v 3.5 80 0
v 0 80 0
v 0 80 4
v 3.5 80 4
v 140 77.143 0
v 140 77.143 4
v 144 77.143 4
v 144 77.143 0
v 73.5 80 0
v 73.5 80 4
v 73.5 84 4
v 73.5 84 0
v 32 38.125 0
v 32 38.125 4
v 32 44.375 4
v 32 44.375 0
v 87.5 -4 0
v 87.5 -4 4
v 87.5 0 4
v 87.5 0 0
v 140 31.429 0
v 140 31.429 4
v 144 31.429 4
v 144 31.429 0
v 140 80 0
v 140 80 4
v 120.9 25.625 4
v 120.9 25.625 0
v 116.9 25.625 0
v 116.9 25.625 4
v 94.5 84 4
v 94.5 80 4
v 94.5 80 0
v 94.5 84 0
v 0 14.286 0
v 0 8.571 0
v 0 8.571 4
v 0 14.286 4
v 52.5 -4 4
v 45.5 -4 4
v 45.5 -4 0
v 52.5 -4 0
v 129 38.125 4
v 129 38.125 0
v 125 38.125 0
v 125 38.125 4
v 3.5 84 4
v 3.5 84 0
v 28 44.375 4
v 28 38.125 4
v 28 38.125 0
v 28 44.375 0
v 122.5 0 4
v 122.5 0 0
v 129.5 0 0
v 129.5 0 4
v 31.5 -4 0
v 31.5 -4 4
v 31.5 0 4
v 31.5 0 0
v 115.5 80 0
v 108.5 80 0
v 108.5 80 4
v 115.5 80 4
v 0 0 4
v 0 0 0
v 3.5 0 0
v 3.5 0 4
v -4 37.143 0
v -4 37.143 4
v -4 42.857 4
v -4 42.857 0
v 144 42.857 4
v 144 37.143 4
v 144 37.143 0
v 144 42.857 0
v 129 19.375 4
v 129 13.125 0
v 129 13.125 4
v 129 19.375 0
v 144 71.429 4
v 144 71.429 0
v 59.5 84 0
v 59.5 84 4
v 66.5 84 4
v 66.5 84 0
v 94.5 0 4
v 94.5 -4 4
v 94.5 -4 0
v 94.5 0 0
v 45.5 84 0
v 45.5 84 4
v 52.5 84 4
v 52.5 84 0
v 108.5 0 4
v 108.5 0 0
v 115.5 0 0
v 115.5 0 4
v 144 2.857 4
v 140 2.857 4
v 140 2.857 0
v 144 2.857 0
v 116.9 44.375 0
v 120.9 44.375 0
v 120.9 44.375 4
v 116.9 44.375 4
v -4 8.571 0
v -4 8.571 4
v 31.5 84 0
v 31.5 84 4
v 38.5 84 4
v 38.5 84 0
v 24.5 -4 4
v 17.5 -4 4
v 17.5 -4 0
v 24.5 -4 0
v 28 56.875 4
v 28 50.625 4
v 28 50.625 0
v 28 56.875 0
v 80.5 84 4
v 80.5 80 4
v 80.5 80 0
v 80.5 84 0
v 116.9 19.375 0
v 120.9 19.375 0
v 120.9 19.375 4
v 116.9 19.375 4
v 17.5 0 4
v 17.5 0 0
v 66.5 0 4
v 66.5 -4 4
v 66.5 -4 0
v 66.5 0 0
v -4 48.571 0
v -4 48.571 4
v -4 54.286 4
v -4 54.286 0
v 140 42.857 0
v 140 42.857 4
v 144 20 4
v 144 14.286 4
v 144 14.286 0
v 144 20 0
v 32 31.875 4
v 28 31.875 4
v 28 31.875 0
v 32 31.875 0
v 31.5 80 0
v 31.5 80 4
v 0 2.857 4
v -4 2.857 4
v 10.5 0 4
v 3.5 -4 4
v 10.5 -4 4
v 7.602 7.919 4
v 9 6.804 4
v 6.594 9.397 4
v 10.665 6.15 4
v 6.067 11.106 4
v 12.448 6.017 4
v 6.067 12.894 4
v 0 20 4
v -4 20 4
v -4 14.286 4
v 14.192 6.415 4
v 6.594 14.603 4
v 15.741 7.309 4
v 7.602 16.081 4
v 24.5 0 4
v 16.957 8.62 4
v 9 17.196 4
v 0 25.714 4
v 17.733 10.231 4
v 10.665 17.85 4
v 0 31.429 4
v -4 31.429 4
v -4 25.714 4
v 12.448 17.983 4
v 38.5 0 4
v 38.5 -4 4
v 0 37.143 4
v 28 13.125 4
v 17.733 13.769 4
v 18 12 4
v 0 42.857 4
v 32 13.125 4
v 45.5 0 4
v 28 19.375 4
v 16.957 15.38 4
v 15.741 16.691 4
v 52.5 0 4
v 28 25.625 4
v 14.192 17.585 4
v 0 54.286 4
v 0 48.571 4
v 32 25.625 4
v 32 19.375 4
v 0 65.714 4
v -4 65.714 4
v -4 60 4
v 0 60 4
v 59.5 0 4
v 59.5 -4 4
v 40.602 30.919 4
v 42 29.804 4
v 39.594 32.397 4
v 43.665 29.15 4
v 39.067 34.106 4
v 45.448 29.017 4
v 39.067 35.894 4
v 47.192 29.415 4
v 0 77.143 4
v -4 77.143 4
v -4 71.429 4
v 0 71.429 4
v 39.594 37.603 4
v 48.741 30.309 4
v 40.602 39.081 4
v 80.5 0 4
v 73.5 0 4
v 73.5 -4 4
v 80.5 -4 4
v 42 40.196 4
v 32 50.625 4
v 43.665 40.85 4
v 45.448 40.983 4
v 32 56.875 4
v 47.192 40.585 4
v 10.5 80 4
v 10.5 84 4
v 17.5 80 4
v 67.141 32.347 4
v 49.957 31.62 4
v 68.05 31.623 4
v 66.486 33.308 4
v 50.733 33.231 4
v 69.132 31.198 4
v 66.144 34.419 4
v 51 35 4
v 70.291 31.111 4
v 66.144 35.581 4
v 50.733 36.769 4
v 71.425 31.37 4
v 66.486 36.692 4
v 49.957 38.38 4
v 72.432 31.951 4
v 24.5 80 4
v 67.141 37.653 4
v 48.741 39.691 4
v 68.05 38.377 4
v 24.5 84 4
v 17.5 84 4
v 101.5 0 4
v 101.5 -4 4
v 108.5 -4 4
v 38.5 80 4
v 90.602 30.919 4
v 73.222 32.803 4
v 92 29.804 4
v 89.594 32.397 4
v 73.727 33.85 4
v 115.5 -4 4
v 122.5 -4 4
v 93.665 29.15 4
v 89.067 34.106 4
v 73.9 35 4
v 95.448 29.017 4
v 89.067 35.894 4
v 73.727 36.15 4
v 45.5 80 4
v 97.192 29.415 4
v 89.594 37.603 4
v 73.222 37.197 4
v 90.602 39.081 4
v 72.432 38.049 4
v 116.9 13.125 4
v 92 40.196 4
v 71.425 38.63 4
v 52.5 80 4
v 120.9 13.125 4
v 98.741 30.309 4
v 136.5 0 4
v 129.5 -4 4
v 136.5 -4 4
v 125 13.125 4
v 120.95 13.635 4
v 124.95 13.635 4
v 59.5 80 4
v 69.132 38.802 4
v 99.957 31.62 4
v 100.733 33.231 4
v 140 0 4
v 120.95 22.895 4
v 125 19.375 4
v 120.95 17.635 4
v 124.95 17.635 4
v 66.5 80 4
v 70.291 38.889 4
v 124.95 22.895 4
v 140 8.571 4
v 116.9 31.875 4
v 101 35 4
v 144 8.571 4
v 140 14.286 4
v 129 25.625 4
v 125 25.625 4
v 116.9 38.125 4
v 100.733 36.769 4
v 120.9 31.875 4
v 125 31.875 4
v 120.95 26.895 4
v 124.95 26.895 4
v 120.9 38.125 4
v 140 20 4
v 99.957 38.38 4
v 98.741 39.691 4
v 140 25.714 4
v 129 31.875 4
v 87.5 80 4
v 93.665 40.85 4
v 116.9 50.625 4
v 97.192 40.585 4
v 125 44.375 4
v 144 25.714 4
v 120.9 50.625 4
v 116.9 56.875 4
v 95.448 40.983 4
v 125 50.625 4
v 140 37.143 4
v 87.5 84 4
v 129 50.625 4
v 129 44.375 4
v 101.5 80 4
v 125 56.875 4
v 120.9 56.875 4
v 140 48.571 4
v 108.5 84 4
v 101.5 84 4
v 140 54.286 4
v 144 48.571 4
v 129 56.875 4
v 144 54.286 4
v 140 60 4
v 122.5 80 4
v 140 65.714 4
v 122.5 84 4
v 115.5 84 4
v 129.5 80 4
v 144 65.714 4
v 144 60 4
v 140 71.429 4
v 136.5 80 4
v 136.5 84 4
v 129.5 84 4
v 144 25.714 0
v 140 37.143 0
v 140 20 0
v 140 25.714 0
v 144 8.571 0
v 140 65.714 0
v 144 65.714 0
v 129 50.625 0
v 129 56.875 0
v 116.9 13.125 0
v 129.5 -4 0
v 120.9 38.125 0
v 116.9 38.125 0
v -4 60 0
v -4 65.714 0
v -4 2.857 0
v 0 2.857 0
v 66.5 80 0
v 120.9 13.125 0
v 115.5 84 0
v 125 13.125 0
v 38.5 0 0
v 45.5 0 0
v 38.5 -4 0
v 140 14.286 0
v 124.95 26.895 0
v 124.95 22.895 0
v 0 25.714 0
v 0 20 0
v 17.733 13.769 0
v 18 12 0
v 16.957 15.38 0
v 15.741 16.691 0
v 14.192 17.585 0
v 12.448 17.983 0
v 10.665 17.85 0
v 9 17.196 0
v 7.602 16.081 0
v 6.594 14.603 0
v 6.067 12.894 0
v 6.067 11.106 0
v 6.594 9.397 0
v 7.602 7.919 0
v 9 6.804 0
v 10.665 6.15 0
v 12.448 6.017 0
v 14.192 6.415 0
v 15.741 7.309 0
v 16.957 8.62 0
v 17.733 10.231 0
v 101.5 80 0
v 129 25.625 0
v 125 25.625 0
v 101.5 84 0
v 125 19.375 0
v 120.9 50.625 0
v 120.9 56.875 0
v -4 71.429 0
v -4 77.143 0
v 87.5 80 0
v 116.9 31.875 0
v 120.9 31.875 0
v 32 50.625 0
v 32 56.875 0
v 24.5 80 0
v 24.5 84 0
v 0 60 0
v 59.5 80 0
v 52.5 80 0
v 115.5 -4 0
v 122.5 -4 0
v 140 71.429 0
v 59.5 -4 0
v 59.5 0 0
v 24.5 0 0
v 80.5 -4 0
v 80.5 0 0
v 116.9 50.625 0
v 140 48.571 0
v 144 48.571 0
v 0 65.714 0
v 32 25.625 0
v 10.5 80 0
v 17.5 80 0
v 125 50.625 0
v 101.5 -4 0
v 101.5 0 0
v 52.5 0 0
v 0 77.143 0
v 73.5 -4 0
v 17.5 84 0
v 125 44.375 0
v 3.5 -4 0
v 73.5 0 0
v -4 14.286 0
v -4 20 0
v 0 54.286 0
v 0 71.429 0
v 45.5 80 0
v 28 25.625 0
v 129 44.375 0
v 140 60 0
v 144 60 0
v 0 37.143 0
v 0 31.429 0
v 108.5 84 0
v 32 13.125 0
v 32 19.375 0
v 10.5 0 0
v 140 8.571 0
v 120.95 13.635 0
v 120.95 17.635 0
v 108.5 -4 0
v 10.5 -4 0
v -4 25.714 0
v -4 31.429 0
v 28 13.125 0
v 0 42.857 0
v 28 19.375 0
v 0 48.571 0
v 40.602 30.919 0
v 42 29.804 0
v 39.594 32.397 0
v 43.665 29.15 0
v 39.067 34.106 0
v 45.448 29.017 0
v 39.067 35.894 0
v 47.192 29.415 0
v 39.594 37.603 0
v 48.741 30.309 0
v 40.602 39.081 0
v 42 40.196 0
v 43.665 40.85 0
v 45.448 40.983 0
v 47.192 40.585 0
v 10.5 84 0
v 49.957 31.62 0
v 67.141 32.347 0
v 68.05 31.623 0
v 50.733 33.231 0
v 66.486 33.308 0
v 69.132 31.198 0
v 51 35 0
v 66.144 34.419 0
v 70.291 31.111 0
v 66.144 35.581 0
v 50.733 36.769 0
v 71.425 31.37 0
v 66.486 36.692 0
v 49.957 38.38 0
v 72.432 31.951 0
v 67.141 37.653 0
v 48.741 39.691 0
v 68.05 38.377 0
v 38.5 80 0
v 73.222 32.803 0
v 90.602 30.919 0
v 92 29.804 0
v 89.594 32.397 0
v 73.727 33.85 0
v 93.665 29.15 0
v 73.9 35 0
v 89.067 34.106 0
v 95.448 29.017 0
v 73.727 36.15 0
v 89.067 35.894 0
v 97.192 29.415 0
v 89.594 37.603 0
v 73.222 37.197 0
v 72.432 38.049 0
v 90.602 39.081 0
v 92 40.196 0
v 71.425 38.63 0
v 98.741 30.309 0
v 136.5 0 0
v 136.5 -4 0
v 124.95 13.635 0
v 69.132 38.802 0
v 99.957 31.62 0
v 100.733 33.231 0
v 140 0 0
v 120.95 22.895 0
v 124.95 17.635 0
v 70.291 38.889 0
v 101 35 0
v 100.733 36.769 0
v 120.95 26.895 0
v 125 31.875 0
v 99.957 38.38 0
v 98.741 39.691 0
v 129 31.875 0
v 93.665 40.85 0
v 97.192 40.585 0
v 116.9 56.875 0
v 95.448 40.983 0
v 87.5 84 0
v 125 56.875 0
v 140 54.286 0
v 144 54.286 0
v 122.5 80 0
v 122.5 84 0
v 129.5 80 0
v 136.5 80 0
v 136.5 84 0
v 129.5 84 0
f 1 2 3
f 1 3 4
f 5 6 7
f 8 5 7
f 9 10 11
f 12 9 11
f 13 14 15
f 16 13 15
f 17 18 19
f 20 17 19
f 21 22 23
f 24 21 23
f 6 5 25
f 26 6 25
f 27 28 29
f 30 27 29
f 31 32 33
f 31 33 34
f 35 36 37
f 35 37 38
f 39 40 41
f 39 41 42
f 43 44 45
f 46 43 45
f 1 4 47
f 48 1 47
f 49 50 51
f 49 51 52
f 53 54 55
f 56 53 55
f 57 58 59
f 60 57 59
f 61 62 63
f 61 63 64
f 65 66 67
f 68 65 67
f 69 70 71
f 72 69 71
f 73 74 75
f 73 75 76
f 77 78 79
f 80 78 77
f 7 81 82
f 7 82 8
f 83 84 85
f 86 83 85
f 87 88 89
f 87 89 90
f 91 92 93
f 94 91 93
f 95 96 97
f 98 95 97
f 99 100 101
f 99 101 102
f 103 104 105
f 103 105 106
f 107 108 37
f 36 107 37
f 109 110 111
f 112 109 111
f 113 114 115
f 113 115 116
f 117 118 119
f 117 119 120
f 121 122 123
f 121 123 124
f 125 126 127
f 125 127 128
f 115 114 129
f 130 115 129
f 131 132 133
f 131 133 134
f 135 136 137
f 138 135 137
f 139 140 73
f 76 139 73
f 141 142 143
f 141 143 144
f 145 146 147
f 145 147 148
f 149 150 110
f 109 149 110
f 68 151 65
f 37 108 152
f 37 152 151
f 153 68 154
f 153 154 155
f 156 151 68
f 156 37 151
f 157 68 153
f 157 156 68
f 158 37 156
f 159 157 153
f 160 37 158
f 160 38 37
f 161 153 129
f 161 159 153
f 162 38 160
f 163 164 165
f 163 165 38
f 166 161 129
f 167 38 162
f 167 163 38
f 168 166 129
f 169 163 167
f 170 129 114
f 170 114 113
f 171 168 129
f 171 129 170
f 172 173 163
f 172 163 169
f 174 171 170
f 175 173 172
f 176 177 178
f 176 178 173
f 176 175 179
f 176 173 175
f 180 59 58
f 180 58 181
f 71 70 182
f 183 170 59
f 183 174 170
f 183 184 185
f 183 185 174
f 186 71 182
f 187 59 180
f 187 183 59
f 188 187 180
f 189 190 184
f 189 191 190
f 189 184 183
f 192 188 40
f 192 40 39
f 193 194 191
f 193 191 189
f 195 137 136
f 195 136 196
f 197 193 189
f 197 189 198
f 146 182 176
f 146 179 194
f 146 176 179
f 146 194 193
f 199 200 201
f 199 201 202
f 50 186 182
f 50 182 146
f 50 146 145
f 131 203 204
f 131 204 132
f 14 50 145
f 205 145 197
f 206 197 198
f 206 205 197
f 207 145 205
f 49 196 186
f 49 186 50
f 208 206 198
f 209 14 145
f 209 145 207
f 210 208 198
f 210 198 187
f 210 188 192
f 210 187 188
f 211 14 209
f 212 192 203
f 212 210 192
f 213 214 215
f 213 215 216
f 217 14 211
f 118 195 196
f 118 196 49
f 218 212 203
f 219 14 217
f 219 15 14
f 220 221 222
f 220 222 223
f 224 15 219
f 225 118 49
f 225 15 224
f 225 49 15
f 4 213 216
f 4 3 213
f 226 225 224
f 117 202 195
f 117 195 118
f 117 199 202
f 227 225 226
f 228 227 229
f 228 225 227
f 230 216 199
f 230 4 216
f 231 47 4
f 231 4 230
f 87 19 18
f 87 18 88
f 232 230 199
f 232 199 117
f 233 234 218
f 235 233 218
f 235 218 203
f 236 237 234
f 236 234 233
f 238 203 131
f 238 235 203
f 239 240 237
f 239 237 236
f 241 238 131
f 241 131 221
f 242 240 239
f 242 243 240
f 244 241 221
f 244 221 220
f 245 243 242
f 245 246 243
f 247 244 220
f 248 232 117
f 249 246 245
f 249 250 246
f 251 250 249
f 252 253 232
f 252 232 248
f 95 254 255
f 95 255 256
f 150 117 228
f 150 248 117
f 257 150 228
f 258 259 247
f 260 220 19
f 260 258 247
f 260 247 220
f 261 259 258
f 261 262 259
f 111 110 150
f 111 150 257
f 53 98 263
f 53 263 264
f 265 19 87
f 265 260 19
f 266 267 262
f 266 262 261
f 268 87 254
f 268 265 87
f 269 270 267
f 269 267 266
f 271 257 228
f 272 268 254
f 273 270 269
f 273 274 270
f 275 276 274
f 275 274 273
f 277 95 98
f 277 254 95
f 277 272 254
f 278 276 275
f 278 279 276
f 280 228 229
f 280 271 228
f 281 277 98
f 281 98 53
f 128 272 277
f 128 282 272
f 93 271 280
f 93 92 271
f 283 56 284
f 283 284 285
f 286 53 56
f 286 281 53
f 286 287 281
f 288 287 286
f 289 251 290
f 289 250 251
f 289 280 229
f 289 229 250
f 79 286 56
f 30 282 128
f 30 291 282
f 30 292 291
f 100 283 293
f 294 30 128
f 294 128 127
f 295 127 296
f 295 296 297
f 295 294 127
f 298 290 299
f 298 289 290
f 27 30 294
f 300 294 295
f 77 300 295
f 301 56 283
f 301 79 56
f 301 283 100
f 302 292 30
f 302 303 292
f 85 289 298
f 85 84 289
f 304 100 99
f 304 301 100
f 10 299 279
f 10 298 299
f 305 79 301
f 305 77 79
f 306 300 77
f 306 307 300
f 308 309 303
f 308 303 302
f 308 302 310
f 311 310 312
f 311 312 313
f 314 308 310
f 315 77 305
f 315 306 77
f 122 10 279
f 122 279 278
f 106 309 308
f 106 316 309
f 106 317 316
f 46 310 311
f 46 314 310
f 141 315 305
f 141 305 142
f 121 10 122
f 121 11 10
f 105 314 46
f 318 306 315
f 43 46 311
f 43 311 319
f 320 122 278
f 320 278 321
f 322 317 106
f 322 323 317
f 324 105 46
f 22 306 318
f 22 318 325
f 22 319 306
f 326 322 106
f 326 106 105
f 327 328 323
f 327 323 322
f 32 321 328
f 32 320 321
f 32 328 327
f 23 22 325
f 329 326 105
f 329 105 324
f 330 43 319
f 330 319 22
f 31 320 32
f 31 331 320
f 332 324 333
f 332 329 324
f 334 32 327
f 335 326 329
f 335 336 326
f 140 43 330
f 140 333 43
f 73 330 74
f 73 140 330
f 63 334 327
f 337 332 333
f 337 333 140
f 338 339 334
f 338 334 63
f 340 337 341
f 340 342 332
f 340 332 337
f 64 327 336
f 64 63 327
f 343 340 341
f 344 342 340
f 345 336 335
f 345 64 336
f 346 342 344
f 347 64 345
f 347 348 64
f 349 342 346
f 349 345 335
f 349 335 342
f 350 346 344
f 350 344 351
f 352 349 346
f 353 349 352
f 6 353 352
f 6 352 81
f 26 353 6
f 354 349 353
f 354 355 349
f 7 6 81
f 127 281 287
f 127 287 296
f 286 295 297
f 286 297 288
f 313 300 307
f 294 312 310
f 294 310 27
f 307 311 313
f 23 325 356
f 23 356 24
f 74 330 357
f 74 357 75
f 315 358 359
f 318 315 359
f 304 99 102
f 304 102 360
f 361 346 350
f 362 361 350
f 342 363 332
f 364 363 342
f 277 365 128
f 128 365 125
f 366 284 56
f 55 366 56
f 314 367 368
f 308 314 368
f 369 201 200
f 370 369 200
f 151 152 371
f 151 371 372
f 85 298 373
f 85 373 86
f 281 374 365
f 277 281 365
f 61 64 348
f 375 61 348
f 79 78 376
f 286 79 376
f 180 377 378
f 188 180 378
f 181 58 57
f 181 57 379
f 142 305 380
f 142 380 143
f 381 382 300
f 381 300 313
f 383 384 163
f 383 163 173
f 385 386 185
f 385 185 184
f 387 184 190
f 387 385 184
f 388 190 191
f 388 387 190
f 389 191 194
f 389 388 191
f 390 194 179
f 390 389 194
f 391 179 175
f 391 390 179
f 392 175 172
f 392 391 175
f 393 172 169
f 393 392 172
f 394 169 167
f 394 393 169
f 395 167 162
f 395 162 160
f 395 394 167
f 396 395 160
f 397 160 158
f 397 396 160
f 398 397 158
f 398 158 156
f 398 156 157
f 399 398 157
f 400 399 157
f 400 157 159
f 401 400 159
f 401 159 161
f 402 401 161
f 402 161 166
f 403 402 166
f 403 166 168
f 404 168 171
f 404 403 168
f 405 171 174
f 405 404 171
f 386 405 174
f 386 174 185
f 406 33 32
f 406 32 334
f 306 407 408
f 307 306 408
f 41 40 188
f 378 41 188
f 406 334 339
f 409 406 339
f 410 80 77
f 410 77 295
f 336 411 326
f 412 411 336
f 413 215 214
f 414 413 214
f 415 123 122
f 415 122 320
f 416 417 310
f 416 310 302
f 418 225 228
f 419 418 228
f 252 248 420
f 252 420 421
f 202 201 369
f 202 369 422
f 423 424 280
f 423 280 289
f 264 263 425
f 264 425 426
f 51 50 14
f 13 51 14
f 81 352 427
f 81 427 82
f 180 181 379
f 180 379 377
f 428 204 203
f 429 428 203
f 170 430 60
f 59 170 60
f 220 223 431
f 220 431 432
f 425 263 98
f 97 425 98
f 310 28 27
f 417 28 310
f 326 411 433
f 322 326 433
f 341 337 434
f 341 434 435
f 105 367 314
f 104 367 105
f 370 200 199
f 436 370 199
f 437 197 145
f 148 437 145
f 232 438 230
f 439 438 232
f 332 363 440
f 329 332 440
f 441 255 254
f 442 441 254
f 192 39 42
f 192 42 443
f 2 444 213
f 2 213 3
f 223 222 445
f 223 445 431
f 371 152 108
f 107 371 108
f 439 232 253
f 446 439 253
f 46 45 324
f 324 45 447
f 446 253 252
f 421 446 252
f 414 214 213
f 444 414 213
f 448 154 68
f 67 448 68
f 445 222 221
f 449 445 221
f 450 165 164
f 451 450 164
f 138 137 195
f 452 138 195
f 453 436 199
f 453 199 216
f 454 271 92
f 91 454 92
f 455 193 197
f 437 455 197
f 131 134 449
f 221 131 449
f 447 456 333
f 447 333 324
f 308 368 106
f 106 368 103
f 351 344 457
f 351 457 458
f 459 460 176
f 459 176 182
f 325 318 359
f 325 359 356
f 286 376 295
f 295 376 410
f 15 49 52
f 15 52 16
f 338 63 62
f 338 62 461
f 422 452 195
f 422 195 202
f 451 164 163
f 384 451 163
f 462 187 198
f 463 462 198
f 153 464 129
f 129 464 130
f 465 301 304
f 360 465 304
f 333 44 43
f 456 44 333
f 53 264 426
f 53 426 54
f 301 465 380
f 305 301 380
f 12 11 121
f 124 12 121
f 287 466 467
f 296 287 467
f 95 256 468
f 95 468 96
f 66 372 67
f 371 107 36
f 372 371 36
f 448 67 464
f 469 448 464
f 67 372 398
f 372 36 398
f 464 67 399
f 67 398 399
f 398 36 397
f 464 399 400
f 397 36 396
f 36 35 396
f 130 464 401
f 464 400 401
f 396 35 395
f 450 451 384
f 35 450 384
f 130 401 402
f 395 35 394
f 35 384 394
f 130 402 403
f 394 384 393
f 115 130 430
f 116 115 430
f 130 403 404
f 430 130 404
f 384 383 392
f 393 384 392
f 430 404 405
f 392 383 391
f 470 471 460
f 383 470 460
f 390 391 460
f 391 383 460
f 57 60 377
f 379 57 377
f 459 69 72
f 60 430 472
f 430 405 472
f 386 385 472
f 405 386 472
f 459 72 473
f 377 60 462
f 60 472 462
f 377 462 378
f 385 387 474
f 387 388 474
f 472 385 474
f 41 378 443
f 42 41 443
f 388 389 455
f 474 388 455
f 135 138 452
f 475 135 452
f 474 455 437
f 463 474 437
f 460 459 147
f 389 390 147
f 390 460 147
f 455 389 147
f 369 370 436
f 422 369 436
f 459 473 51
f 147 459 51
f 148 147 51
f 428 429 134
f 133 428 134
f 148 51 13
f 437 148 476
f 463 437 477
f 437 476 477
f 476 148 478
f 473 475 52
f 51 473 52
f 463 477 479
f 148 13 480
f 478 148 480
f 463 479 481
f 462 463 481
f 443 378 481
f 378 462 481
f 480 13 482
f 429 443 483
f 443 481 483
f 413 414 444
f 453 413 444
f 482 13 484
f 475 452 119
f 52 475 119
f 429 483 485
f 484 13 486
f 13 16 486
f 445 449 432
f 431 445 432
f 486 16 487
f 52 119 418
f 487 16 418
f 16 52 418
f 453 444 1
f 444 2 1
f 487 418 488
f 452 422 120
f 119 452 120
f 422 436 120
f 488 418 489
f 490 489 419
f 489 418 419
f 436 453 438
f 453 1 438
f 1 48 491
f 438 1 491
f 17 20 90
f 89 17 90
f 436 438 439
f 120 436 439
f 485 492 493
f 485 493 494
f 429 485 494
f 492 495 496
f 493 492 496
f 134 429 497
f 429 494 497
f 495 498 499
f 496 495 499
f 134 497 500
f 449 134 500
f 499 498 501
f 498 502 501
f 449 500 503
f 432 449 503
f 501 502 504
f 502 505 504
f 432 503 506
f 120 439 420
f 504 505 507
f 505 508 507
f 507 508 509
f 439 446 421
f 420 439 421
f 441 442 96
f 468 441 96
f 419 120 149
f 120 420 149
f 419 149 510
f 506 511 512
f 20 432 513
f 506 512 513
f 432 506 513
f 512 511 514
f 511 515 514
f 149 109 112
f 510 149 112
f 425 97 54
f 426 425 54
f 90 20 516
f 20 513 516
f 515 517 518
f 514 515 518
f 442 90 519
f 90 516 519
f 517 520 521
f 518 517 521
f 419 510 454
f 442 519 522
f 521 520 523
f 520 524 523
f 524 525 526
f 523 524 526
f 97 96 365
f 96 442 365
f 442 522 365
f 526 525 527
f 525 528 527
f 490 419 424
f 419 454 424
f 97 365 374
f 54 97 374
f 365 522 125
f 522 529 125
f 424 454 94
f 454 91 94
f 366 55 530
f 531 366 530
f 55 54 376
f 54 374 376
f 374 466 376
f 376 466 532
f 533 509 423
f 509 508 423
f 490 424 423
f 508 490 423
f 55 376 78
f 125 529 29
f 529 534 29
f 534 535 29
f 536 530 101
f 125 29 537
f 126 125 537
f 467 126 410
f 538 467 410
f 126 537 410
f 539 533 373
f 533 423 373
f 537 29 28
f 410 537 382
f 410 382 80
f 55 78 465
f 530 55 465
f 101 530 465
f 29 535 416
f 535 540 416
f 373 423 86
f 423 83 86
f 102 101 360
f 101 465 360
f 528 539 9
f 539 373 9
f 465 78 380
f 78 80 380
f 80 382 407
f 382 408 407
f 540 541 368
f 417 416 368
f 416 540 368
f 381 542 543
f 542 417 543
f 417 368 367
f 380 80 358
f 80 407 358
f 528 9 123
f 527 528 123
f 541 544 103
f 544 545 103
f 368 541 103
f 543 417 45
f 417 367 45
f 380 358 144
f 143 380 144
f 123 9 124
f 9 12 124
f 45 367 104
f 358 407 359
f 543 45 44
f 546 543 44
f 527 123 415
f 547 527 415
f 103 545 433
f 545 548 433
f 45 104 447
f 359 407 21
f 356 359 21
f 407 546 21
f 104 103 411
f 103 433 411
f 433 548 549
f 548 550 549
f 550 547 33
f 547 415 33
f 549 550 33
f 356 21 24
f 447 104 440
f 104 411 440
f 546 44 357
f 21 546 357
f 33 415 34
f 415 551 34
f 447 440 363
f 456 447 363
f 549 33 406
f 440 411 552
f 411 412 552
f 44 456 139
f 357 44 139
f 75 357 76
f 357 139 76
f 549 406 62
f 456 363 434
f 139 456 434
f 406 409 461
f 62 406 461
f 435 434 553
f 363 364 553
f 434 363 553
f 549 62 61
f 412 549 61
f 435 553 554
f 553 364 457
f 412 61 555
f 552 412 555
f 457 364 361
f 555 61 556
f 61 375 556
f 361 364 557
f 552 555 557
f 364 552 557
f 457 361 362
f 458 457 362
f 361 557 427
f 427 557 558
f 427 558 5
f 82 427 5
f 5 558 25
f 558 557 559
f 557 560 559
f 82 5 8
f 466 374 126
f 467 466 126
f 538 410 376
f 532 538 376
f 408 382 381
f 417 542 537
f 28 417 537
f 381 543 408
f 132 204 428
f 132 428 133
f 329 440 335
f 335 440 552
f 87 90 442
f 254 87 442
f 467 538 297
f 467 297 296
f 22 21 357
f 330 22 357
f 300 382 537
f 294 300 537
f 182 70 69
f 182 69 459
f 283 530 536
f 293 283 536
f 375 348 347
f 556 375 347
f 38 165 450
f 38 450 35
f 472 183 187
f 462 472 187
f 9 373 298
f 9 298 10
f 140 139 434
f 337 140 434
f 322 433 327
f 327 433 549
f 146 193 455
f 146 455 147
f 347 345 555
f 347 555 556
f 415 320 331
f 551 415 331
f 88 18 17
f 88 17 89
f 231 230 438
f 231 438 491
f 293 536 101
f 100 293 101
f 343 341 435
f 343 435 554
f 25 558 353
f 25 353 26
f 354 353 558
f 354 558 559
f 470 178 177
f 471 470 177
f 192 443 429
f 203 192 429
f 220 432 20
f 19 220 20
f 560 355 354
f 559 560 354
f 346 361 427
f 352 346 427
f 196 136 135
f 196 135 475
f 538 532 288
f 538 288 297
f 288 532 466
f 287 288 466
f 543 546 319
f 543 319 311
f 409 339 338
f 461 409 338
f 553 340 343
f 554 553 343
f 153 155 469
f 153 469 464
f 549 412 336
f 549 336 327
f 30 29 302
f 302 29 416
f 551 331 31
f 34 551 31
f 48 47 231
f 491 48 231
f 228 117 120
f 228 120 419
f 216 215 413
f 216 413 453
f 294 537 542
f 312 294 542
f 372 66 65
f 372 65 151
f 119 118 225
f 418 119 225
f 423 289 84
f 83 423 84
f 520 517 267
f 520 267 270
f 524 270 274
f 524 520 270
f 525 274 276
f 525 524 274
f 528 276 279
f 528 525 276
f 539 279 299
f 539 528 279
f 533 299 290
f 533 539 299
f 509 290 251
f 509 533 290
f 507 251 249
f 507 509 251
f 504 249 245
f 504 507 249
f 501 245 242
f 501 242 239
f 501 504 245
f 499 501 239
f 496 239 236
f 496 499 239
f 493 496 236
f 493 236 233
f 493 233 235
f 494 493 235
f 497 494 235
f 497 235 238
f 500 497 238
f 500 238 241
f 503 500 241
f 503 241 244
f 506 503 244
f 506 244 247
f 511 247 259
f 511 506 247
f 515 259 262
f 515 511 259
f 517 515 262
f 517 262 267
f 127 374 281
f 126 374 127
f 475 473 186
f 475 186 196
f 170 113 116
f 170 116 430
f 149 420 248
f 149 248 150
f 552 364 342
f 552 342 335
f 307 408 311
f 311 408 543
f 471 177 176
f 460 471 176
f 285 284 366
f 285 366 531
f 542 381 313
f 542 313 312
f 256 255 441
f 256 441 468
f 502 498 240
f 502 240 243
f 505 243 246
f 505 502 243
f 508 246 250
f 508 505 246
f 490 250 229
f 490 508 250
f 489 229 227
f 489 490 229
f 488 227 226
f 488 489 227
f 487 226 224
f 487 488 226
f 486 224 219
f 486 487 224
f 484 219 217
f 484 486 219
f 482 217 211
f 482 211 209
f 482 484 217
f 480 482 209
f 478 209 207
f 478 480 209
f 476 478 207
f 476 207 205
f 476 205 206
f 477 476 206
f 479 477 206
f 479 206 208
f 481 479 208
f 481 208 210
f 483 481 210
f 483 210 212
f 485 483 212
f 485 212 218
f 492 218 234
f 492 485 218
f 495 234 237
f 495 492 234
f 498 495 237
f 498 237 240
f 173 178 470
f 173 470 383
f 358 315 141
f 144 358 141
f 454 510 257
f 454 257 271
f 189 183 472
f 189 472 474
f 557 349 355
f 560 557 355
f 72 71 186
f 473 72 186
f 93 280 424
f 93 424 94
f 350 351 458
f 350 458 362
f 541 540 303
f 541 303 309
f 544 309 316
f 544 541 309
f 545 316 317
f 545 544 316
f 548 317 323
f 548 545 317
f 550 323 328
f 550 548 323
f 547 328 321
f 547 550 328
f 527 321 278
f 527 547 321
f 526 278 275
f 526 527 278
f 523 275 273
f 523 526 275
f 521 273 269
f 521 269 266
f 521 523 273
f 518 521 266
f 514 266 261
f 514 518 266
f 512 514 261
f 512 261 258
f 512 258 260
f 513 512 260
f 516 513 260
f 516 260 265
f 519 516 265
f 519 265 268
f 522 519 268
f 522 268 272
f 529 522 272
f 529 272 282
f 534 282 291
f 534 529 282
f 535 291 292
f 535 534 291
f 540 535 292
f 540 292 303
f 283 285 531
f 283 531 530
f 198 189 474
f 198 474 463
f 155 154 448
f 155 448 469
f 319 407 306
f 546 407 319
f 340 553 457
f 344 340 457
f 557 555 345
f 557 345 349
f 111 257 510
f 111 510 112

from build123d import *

# Parameters (mm, degrees)
SCHIZZO1_W                   = 140
SCHIZZO1_H                   = 80
SCHIZZO1_R                   = 6
SCHIZZO1_R_2                 = 3.9
ESTRUSIONE_ESTRUSIONE1_DEPTH = 4
SCHIZZO2_W                   = 7
SCHIZZO2_H                   = 4
ESTRUSIONE_ESTRUSIONE2_DEPTH = 4
RIPETIZIONE_A_L1_COUNT       = 10
RIPETIZIONE_A_L1_PITCH       = 14
SCHIZZO3_W                   = 4
SCHIZZO3_H                   = 5.714285714
ESTRUSIONE_ESTRUSIONE3_DEPTH = 4
RIPETIZIONE_A_L2_COUNT       = 7
RIPETIZIONE_A_L2_PITCH       = 11.428571429
SCHIZZO4_W                   = 4
SCHIZZO4_H                   = 6.25
TAGLIO_ESTRUSIONE1_DEPTH     = 167.757308685
RIPETIZIONE_A_L3_COUNT       = 4
RIPETIZIONE_A_L3_PITCH       = 12.5
SCHIZZO5_W                   = 4
SCHIZZO5_H                   = 6.25
TAGLIO_ESTRUSIONE2_DEPTH     = 167.757308685
RIPETIZIONE_A_L4_COUNT       = 4
RIPETIZIONE_A_L4_PITCH       = 12.5
SCHIZZO6_W                   = 4
SCHIZZO6_H                   = 4
TAGLIO_ESTRUSIONE3_DEPTH     = 167.757308685


with BuildPart() as part:
    # Schizzo1 → Estrusione-Estrusione1 (new body)
    with BuildSketch(Plane.XY):
        with Locations((70, 40)):
            Rectangle(SCHIZZO1_W, SCHIZZO1_H)
        with Locations((45, 35)):
            Circle(SCHIZZO1_R, mode=Mode.SUBTRACT)
        with Locations((95, 35)):
            Circle(SCHIZZO1_R, mode=Mode.SUBTRACT)
        with Locations((12, 12)):
            Circle(SCHIZZO1_R, mode=Mode.SUBTRACT)
        with Locations((70, 35)):
            Circle(SCHIZZO1_R_2, mode=Mode.SUBTRACT)
    extrude(amount=ESTRUSIONE_ESTRUSIONE1_DEPTH)

    # Schizzo2 → Estrusione-Estrusione2 (add)
    with BuildSketch(Plane.XY.offset(4)):
        with Locations((7, 82)):
            Rectangle(SCHIZZO2_W, SCHIZZO2_H)
        with Locations((7, -2)):
            Rectangle(SCHIZZO2_W, SCHIZZO2_H)
    estrusione_estrusione2 = extrude(amount=-ESTRUSIONE_ESTRUSIONE2_DEPTH)

    # Ripetizione a L1: Estrusione-Estrusione2 ×10
    with Locations(*[(i * RIPETIZIONE_A_L1_PITCH, 0, 0) for i in range(1, RIPETIZIONE_A_L1_COUNT)]):
        add(estrusione_estrusione2)

    # Schizzo3 → Estrusione-Estrusione3 (add)
    with BuildSketch(Plane.XY.offset(4)):
        with Locations((-2, 74.285714286)):
            Rectangle(SCHIZZO3_W, SCHIZZO3_H)
        with Locations((142, 74.285714286)):
            Rectangle(SCHIZZO3_W, SCHIZZO3_H)
    estrusione_estrusione3 = extrude(amount=-ESTRUSIONE_ESTRUSIONE3_DEPTH)

    # Ripetizione a L2: Estrusione-Estrusione3 ×7
    with Locations(*[(0, -i * RIPETIZIONE_A_L2_PITCH, 0) for i in range(1, RIPETIZIONE_A_L2_COUNT)]):
        add(estrusione_estrusione3)

    # Schizzo4 → Taglio-Estrusione1 (cut, through all)
    with BuildSketch(Plane.XY.offset(4)):
        with Locations((30, 53.75)):
            Rectangle(SCHIZZO4_W, SCHIZZO4_H)
    taglio_estrusione1 = extrude(amount=-TAGLIO_ESTRUSIONE1_DEPTH, mode=Mode.SUBTRACT)

    # Ripetizione a L3: Taglio-Estrusione1 ×4
    with Locations(*[(0, -i * RIPETIZIONE_A_L3_PITCH, 0) for i in range(1, RIPETIZIONE_A_L3_COUNT)]):
        add(taglio_estrusione1, mode=Mode.SUBTRACT)

    # Schizzo5 → Taglio-Estrusione2 (cut, through all)
    with BuildSketch(Plane(origin=(0, 0, 0), x_dir=(-1, 0, 0), z_dir=(0, 0, -1))):
        with Locations((-127, 53.75)):
            Rectangle(SCHIZZO5_W, SCHIZZO5_H)
        with Locations((-118.9, 53.75)):
            Rectangle(SCHIZZO5_W, SCHIZZO5_H)
    taglio_estrusione2 = extrude(amount=-TAGLIO_ESTRUSIONE2_DEPTH, mode=Mode.SUBTRACT)

    # Ripetizione a L4: Taglio-Estrusione2 ×4
    with Locations(*[(0, -i * RIPETIZIONE_A_L4_PITCH, 0) for i in range(1, RIPETIZIONE_A_L4_COUNT)]):
        add(taglio_estrusione2, mode=Mode.SUBTRACT)

    # Schizzo6 → Taglio-Estrusione3 (cut, through all)
    with BuildSketch(Plane(origin=(0, 0, 0), x_dir=(-1, 0, 0), z_dir=(0, 0, -1))):
        with Locations((-122.95, 15.634824405)):
            Rectangle(SCHIZZO6_W, SCHIZZO6_H)
        with Locations((-122.95, 24.894824405)):
            Rectangle(SCHIZZO6_W, SCHIZZO6_H)
    extrude(amount=-TAGLIO_ESTRUSIONE3_DEPTH, mode=Mode.SUBTRACT)


solid = part.part
